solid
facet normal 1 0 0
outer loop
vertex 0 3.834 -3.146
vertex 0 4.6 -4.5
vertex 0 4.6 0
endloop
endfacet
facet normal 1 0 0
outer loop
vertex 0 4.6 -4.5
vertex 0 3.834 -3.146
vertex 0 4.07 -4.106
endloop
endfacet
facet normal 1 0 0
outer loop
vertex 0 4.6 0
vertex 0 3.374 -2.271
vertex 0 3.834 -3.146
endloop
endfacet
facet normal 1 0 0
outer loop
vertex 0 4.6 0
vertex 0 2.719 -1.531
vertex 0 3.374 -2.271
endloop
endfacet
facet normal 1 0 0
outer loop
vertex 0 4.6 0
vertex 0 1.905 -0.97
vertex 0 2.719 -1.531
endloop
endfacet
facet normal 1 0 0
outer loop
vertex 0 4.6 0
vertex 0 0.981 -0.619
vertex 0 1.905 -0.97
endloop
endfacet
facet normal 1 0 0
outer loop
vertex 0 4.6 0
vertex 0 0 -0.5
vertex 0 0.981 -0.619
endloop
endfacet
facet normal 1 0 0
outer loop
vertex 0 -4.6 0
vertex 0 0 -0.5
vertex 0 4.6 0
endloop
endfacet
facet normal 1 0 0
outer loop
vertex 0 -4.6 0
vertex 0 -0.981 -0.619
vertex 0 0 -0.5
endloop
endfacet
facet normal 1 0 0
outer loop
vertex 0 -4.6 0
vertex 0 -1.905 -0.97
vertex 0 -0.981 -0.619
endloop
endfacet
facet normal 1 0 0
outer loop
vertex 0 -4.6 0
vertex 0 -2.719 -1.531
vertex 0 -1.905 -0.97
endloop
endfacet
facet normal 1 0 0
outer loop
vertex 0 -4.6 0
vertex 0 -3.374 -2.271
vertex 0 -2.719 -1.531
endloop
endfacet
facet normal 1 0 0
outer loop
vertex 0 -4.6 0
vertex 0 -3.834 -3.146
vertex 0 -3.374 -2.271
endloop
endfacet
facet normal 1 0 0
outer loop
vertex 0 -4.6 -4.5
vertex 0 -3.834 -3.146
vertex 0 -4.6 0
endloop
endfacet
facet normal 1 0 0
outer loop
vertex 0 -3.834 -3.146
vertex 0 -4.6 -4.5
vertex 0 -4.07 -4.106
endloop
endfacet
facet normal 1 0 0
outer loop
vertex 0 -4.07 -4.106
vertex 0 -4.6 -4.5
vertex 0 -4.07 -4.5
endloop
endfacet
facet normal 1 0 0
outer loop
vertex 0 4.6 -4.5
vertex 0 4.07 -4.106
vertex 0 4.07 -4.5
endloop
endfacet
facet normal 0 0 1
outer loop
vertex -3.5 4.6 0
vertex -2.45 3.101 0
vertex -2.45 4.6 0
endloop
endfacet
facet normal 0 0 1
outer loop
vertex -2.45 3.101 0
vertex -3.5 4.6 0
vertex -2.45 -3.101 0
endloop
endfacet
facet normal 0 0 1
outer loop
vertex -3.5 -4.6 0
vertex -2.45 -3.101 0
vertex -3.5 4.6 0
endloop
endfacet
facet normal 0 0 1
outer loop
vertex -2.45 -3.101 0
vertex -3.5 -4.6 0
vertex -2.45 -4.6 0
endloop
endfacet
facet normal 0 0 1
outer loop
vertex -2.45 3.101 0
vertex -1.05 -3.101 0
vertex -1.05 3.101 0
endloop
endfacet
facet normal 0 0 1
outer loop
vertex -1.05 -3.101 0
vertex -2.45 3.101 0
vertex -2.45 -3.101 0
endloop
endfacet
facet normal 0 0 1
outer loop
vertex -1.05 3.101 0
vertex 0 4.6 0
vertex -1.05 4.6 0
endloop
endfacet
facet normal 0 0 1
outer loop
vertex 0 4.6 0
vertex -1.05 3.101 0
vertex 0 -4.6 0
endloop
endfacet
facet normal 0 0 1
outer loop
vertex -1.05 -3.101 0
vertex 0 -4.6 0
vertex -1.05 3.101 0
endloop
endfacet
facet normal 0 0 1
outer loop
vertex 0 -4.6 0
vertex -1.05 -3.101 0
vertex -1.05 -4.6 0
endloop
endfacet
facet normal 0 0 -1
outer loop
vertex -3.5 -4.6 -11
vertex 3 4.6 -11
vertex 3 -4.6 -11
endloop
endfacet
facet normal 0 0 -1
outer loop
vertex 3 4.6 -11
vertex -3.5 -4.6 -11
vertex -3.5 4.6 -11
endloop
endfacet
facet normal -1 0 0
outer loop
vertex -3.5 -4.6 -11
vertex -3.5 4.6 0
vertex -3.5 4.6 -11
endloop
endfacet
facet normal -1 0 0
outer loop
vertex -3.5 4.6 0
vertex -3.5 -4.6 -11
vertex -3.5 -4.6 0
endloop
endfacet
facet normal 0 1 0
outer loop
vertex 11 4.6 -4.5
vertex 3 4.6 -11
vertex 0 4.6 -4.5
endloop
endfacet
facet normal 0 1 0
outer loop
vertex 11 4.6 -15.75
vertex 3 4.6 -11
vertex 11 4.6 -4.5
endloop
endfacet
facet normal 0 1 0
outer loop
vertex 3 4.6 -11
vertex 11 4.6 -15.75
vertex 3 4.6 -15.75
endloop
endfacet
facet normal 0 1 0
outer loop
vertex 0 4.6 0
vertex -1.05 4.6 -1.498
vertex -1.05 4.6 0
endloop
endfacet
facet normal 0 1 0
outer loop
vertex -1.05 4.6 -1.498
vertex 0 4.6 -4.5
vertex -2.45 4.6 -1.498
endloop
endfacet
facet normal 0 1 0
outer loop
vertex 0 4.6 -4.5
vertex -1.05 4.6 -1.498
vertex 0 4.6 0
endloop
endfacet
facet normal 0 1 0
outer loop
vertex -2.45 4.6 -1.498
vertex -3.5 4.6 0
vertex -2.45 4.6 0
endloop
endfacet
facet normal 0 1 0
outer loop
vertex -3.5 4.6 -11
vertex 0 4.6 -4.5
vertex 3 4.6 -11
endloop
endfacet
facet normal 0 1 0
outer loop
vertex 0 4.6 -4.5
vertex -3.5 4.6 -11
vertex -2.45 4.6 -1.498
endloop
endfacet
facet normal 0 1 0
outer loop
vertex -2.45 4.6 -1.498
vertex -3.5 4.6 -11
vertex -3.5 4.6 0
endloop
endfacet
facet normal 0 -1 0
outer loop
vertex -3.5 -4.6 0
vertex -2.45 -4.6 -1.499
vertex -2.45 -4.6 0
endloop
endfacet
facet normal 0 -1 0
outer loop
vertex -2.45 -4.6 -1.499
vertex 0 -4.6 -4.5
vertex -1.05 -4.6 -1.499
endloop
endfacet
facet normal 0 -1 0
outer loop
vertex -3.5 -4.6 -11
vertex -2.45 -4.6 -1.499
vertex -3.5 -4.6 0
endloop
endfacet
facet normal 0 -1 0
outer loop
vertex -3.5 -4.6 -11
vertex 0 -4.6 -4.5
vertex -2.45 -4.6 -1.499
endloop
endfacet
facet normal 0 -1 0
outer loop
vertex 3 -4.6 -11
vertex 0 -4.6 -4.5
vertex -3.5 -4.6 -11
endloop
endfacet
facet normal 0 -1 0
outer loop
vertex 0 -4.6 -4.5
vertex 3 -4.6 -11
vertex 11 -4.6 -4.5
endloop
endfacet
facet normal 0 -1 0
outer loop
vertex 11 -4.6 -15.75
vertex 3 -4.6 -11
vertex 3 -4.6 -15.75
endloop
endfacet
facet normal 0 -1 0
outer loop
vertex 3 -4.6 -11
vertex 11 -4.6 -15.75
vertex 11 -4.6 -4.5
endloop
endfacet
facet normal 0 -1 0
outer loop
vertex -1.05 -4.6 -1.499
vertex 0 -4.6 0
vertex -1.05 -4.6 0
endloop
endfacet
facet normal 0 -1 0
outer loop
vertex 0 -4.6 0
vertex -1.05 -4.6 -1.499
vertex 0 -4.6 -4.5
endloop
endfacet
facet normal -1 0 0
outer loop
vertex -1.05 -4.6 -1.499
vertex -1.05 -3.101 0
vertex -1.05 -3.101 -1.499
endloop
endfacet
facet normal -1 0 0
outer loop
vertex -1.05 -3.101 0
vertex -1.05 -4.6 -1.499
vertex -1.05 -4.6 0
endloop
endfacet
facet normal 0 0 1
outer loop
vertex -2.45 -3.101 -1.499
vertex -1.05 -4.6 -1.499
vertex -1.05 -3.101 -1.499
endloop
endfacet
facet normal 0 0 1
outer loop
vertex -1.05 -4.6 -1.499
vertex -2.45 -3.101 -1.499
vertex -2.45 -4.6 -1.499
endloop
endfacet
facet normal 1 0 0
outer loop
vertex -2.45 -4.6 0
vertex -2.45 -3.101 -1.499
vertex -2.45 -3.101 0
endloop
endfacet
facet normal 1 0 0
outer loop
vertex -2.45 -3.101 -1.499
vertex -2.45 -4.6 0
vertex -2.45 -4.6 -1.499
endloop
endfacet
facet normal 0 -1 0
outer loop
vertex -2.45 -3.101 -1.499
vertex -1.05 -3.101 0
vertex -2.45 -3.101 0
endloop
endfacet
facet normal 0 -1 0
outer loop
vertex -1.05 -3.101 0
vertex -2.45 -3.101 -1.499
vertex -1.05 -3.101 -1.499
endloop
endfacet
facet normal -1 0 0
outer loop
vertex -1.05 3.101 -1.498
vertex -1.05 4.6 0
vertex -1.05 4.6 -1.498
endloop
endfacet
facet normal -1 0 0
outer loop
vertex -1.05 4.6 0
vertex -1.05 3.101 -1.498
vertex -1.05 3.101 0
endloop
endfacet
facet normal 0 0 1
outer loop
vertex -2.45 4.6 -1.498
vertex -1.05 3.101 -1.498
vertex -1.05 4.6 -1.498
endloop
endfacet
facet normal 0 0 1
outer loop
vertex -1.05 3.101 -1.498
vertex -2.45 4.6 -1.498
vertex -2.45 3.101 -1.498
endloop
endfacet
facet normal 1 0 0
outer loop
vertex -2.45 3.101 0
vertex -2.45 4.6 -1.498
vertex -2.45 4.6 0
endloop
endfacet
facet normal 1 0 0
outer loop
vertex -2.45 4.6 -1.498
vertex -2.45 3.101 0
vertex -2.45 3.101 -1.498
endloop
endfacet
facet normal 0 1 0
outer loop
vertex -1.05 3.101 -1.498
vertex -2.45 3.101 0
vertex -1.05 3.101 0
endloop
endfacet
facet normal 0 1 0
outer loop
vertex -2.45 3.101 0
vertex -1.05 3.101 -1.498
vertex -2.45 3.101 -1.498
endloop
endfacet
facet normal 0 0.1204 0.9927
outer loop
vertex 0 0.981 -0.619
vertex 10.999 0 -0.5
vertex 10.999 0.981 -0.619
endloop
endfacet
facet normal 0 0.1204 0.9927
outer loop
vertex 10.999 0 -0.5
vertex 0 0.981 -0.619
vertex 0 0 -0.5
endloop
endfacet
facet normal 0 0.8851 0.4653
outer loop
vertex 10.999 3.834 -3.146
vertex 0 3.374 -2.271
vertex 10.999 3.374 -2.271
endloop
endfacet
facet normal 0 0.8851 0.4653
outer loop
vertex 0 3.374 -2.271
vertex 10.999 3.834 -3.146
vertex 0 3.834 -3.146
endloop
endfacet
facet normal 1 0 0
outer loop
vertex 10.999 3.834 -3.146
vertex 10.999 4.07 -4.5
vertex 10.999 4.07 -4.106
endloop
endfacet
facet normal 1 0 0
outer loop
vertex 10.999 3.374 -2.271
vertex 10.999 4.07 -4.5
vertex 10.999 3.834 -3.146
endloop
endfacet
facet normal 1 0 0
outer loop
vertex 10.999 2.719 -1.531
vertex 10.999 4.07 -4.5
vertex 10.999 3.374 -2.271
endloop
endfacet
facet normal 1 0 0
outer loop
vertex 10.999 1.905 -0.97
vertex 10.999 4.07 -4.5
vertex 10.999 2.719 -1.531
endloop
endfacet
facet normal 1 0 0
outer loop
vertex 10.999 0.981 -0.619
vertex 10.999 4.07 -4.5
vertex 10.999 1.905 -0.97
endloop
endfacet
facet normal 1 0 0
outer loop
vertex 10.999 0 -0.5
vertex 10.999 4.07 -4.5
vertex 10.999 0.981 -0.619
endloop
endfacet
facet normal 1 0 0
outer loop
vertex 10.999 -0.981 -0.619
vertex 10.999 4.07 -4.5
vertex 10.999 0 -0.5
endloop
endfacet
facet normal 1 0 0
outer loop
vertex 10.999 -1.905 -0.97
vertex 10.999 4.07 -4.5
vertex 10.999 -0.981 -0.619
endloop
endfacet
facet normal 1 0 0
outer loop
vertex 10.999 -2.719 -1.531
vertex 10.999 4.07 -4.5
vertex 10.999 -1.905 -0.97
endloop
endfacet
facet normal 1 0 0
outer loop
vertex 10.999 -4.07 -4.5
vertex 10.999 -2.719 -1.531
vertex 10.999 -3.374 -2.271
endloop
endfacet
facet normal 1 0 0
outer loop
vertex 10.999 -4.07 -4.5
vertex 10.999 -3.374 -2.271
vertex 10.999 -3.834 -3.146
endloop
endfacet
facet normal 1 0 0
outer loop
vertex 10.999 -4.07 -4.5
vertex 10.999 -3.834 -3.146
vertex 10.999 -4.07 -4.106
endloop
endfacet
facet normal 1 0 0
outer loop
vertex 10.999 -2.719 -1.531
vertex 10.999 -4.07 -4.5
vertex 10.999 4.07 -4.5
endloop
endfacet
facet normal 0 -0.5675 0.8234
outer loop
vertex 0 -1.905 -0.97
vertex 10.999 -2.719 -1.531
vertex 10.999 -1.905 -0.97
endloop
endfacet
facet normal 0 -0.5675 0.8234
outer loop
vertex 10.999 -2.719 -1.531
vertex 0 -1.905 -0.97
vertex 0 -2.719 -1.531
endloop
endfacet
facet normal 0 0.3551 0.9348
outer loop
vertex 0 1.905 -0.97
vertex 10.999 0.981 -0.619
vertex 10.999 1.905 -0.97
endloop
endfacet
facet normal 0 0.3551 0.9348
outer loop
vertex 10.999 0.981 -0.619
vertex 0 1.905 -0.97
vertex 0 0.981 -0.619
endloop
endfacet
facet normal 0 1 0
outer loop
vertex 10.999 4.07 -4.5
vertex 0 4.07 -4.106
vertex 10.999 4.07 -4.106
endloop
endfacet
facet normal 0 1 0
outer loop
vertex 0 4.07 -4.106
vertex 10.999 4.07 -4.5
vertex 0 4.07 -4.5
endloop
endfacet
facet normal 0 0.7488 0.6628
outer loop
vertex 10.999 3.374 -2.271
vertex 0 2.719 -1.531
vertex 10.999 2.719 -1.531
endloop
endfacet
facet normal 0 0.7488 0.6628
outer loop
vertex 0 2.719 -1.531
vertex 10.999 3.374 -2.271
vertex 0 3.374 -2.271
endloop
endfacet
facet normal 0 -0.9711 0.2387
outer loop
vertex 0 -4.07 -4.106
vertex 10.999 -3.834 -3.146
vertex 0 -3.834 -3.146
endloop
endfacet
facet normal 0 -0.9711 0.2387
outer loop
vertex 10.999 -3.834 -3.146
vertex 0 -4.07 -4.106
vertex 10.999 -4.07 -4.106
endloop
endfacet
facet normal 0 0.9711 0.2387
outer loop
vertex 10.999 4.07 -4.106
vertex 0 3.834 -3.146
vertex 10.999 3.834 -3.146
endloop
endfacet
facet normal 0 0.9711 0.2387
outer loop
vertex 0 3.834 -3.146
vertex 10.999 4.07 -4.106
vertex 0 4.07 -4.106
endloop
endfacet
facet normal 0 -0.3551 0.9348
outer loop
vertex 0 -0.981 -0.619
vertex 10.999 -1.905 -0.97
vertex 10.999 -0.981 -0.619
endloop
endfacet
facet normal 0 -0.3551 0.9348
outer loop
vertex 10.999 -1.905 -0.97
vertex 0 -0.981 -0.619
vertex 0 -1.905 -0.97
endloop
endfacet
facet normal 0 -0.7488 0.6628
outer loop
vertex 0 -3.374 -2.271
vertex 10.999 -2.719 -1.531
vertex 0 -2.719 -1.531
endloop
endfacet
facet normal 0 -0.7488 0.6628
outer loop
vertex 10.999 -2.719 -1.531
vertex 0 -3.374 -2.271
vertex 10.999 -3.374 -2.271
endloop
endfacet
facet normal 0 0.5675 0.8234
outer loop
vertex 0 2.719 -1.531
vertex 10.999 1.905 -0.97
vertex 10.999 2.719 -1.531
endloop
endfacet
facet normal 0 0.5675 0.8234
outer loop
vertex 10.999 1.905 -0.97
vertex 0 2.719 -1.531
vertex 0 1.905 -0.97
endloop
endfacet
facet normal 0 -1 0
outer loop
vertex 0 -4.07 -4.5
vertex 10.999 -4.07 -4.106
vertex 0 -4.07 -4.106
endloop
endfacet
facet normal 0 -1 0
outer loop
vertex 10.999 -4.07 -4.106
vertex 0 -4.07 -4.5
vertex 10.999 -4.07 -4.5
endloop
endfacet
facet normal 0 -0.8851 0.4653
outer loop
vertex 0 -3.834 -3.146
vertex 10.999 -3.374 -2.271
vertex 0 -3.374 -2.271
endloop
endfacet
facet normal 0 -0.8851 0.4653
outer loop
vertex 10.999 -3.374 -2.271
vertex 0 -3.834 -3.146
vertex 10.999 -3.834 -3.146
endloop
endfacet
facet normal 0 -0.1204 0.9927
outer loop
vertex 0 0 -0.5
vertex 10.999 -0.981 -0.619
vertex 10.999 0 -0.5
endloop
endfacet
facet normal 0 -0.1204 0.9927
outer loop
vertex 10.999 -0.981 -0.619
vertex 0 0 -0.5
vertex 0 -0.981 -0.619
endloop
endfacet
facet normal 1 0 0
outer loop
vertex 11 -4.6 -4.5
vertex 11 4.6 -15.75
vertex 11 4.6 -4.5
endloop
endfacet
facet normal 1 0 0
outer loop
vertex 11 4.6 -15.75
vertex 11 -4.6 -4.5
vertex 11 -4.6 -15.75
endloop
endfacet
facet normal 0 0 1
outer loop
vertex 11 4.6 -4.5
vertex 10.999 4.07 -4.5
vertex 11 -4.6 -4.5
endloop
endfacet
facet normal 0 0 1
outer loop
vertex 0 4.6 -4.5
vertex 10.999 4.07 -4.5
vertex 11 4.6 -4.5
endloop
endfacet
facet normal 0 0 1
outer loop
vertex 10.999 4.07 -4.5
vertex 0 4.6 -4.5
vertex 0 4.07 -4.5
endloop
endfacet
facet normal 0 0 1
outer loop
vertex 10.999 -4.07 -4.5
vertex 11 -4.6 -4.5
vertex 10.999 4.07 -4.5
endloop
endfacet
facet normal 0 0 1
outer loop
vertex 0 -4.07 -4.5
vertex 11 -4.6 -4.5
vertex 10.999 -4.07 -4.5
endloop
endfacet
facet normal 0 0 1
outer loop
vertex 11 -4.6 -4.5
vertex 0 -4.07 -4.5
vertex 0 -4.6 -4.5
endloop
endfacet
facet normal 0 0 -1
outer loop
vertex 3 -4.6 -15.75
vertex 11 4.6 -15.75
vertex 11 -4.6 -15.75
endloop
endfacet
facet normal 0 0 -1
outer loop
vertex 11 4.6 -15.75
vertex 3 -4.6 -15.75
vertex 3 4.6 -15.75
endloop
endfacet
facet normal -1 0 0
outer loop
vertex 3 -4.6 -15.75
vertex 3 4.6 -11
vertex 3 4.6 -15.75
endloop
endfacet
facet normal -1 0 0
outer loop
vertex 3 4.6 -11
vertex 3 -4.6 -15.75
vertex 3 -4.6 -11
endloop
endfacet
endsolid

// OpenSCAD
$fs=1;
$fa=0.4;

width = 9.2;
height = 11;
depth = 14.5;

barrel_radius = 4.1;
barrel_top_offset = 0.5;

plate_thickness = 3.5;

bottom_depth = 14.5;

module power_connector() {
    difference() {
        translate([-plate_thickness/2, 0, -height/2])
            cube([plate_thickness, width, height], center=true);
        translate([-plate_thickness/2, -width/2+1.5/2-0.001, -1.5/2+0.001])
            cube([1.4, 1.5, 1.5], center=true);
        translate([-plate_thickness/2, +width/2-1.5/2+0.001, -1.5/2+0.002])
            cube([1.4, 1.5, 1.5], center=true);
    }
    translate([(depth-plate_thickness)/2-0.001, 0, -barrel_radius-barrel_top_offset])
        rotate([0, 90, 0])
        cylinder(h=depth-plate_thickness, r=barrel_radius, center=true);
    translate([bottom_depth/2-plate_thickness, 0, -height/2-(height-6.5)/2])
        cube([bottom_depth, width, 6.5], center=true);
    translate([bottom_depth/2-0.25, 0, -height/2-(height-6.5)/2-5])
        cube([8, width, 6], center=true);
}

power_connector();
